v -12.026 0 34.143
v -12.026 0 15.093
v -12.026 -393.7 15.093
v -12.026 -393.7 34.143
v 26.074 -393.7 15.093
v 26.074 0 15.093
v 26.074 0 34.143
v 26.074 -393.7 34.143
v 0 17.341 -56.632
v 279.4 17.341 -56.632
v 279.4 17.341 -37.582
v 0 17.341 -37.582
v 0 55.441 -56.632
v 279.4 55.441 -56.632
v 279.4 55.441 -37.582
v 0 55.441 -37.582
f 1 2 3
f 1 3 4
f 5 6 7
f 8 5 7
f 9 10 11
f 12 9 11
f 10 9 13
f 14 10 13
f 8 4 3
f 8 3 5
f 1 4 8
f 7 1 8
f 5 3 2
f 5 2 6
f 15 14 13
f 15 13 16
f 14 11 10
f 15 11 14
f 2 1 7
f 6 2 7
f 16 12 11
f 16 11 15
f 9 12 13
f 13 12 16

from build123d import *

# Parameters (mm, degrees)
F0_W     = 38.1
F0_H     = 19.05
F1_DEPTH = 279.4
F2_W     = 38.1
F2_H     = 19.05
F3_DEPTH = 393.7


with BuildPart() as f1:
    # F0 (on Right) → F1 (new body)
    with BuildSketch(Plane.YZ):
        with Locations((36.391488, -47.107239)):
            Rectangle(F0_W, F0_H)
    extrude(amount=F1_DEPTH)


with BuildPart() as f3:
    # F2 (on Front) → F3 (new body)
    with BuildSketch(Plane.XZ):
        with Locations((7.023689, 24.617738)):
            Rectangle(F2_W, F2_H)
    extrude(amount=F3_DEPTH)


solid = Compound([f1.part, f3.part])
